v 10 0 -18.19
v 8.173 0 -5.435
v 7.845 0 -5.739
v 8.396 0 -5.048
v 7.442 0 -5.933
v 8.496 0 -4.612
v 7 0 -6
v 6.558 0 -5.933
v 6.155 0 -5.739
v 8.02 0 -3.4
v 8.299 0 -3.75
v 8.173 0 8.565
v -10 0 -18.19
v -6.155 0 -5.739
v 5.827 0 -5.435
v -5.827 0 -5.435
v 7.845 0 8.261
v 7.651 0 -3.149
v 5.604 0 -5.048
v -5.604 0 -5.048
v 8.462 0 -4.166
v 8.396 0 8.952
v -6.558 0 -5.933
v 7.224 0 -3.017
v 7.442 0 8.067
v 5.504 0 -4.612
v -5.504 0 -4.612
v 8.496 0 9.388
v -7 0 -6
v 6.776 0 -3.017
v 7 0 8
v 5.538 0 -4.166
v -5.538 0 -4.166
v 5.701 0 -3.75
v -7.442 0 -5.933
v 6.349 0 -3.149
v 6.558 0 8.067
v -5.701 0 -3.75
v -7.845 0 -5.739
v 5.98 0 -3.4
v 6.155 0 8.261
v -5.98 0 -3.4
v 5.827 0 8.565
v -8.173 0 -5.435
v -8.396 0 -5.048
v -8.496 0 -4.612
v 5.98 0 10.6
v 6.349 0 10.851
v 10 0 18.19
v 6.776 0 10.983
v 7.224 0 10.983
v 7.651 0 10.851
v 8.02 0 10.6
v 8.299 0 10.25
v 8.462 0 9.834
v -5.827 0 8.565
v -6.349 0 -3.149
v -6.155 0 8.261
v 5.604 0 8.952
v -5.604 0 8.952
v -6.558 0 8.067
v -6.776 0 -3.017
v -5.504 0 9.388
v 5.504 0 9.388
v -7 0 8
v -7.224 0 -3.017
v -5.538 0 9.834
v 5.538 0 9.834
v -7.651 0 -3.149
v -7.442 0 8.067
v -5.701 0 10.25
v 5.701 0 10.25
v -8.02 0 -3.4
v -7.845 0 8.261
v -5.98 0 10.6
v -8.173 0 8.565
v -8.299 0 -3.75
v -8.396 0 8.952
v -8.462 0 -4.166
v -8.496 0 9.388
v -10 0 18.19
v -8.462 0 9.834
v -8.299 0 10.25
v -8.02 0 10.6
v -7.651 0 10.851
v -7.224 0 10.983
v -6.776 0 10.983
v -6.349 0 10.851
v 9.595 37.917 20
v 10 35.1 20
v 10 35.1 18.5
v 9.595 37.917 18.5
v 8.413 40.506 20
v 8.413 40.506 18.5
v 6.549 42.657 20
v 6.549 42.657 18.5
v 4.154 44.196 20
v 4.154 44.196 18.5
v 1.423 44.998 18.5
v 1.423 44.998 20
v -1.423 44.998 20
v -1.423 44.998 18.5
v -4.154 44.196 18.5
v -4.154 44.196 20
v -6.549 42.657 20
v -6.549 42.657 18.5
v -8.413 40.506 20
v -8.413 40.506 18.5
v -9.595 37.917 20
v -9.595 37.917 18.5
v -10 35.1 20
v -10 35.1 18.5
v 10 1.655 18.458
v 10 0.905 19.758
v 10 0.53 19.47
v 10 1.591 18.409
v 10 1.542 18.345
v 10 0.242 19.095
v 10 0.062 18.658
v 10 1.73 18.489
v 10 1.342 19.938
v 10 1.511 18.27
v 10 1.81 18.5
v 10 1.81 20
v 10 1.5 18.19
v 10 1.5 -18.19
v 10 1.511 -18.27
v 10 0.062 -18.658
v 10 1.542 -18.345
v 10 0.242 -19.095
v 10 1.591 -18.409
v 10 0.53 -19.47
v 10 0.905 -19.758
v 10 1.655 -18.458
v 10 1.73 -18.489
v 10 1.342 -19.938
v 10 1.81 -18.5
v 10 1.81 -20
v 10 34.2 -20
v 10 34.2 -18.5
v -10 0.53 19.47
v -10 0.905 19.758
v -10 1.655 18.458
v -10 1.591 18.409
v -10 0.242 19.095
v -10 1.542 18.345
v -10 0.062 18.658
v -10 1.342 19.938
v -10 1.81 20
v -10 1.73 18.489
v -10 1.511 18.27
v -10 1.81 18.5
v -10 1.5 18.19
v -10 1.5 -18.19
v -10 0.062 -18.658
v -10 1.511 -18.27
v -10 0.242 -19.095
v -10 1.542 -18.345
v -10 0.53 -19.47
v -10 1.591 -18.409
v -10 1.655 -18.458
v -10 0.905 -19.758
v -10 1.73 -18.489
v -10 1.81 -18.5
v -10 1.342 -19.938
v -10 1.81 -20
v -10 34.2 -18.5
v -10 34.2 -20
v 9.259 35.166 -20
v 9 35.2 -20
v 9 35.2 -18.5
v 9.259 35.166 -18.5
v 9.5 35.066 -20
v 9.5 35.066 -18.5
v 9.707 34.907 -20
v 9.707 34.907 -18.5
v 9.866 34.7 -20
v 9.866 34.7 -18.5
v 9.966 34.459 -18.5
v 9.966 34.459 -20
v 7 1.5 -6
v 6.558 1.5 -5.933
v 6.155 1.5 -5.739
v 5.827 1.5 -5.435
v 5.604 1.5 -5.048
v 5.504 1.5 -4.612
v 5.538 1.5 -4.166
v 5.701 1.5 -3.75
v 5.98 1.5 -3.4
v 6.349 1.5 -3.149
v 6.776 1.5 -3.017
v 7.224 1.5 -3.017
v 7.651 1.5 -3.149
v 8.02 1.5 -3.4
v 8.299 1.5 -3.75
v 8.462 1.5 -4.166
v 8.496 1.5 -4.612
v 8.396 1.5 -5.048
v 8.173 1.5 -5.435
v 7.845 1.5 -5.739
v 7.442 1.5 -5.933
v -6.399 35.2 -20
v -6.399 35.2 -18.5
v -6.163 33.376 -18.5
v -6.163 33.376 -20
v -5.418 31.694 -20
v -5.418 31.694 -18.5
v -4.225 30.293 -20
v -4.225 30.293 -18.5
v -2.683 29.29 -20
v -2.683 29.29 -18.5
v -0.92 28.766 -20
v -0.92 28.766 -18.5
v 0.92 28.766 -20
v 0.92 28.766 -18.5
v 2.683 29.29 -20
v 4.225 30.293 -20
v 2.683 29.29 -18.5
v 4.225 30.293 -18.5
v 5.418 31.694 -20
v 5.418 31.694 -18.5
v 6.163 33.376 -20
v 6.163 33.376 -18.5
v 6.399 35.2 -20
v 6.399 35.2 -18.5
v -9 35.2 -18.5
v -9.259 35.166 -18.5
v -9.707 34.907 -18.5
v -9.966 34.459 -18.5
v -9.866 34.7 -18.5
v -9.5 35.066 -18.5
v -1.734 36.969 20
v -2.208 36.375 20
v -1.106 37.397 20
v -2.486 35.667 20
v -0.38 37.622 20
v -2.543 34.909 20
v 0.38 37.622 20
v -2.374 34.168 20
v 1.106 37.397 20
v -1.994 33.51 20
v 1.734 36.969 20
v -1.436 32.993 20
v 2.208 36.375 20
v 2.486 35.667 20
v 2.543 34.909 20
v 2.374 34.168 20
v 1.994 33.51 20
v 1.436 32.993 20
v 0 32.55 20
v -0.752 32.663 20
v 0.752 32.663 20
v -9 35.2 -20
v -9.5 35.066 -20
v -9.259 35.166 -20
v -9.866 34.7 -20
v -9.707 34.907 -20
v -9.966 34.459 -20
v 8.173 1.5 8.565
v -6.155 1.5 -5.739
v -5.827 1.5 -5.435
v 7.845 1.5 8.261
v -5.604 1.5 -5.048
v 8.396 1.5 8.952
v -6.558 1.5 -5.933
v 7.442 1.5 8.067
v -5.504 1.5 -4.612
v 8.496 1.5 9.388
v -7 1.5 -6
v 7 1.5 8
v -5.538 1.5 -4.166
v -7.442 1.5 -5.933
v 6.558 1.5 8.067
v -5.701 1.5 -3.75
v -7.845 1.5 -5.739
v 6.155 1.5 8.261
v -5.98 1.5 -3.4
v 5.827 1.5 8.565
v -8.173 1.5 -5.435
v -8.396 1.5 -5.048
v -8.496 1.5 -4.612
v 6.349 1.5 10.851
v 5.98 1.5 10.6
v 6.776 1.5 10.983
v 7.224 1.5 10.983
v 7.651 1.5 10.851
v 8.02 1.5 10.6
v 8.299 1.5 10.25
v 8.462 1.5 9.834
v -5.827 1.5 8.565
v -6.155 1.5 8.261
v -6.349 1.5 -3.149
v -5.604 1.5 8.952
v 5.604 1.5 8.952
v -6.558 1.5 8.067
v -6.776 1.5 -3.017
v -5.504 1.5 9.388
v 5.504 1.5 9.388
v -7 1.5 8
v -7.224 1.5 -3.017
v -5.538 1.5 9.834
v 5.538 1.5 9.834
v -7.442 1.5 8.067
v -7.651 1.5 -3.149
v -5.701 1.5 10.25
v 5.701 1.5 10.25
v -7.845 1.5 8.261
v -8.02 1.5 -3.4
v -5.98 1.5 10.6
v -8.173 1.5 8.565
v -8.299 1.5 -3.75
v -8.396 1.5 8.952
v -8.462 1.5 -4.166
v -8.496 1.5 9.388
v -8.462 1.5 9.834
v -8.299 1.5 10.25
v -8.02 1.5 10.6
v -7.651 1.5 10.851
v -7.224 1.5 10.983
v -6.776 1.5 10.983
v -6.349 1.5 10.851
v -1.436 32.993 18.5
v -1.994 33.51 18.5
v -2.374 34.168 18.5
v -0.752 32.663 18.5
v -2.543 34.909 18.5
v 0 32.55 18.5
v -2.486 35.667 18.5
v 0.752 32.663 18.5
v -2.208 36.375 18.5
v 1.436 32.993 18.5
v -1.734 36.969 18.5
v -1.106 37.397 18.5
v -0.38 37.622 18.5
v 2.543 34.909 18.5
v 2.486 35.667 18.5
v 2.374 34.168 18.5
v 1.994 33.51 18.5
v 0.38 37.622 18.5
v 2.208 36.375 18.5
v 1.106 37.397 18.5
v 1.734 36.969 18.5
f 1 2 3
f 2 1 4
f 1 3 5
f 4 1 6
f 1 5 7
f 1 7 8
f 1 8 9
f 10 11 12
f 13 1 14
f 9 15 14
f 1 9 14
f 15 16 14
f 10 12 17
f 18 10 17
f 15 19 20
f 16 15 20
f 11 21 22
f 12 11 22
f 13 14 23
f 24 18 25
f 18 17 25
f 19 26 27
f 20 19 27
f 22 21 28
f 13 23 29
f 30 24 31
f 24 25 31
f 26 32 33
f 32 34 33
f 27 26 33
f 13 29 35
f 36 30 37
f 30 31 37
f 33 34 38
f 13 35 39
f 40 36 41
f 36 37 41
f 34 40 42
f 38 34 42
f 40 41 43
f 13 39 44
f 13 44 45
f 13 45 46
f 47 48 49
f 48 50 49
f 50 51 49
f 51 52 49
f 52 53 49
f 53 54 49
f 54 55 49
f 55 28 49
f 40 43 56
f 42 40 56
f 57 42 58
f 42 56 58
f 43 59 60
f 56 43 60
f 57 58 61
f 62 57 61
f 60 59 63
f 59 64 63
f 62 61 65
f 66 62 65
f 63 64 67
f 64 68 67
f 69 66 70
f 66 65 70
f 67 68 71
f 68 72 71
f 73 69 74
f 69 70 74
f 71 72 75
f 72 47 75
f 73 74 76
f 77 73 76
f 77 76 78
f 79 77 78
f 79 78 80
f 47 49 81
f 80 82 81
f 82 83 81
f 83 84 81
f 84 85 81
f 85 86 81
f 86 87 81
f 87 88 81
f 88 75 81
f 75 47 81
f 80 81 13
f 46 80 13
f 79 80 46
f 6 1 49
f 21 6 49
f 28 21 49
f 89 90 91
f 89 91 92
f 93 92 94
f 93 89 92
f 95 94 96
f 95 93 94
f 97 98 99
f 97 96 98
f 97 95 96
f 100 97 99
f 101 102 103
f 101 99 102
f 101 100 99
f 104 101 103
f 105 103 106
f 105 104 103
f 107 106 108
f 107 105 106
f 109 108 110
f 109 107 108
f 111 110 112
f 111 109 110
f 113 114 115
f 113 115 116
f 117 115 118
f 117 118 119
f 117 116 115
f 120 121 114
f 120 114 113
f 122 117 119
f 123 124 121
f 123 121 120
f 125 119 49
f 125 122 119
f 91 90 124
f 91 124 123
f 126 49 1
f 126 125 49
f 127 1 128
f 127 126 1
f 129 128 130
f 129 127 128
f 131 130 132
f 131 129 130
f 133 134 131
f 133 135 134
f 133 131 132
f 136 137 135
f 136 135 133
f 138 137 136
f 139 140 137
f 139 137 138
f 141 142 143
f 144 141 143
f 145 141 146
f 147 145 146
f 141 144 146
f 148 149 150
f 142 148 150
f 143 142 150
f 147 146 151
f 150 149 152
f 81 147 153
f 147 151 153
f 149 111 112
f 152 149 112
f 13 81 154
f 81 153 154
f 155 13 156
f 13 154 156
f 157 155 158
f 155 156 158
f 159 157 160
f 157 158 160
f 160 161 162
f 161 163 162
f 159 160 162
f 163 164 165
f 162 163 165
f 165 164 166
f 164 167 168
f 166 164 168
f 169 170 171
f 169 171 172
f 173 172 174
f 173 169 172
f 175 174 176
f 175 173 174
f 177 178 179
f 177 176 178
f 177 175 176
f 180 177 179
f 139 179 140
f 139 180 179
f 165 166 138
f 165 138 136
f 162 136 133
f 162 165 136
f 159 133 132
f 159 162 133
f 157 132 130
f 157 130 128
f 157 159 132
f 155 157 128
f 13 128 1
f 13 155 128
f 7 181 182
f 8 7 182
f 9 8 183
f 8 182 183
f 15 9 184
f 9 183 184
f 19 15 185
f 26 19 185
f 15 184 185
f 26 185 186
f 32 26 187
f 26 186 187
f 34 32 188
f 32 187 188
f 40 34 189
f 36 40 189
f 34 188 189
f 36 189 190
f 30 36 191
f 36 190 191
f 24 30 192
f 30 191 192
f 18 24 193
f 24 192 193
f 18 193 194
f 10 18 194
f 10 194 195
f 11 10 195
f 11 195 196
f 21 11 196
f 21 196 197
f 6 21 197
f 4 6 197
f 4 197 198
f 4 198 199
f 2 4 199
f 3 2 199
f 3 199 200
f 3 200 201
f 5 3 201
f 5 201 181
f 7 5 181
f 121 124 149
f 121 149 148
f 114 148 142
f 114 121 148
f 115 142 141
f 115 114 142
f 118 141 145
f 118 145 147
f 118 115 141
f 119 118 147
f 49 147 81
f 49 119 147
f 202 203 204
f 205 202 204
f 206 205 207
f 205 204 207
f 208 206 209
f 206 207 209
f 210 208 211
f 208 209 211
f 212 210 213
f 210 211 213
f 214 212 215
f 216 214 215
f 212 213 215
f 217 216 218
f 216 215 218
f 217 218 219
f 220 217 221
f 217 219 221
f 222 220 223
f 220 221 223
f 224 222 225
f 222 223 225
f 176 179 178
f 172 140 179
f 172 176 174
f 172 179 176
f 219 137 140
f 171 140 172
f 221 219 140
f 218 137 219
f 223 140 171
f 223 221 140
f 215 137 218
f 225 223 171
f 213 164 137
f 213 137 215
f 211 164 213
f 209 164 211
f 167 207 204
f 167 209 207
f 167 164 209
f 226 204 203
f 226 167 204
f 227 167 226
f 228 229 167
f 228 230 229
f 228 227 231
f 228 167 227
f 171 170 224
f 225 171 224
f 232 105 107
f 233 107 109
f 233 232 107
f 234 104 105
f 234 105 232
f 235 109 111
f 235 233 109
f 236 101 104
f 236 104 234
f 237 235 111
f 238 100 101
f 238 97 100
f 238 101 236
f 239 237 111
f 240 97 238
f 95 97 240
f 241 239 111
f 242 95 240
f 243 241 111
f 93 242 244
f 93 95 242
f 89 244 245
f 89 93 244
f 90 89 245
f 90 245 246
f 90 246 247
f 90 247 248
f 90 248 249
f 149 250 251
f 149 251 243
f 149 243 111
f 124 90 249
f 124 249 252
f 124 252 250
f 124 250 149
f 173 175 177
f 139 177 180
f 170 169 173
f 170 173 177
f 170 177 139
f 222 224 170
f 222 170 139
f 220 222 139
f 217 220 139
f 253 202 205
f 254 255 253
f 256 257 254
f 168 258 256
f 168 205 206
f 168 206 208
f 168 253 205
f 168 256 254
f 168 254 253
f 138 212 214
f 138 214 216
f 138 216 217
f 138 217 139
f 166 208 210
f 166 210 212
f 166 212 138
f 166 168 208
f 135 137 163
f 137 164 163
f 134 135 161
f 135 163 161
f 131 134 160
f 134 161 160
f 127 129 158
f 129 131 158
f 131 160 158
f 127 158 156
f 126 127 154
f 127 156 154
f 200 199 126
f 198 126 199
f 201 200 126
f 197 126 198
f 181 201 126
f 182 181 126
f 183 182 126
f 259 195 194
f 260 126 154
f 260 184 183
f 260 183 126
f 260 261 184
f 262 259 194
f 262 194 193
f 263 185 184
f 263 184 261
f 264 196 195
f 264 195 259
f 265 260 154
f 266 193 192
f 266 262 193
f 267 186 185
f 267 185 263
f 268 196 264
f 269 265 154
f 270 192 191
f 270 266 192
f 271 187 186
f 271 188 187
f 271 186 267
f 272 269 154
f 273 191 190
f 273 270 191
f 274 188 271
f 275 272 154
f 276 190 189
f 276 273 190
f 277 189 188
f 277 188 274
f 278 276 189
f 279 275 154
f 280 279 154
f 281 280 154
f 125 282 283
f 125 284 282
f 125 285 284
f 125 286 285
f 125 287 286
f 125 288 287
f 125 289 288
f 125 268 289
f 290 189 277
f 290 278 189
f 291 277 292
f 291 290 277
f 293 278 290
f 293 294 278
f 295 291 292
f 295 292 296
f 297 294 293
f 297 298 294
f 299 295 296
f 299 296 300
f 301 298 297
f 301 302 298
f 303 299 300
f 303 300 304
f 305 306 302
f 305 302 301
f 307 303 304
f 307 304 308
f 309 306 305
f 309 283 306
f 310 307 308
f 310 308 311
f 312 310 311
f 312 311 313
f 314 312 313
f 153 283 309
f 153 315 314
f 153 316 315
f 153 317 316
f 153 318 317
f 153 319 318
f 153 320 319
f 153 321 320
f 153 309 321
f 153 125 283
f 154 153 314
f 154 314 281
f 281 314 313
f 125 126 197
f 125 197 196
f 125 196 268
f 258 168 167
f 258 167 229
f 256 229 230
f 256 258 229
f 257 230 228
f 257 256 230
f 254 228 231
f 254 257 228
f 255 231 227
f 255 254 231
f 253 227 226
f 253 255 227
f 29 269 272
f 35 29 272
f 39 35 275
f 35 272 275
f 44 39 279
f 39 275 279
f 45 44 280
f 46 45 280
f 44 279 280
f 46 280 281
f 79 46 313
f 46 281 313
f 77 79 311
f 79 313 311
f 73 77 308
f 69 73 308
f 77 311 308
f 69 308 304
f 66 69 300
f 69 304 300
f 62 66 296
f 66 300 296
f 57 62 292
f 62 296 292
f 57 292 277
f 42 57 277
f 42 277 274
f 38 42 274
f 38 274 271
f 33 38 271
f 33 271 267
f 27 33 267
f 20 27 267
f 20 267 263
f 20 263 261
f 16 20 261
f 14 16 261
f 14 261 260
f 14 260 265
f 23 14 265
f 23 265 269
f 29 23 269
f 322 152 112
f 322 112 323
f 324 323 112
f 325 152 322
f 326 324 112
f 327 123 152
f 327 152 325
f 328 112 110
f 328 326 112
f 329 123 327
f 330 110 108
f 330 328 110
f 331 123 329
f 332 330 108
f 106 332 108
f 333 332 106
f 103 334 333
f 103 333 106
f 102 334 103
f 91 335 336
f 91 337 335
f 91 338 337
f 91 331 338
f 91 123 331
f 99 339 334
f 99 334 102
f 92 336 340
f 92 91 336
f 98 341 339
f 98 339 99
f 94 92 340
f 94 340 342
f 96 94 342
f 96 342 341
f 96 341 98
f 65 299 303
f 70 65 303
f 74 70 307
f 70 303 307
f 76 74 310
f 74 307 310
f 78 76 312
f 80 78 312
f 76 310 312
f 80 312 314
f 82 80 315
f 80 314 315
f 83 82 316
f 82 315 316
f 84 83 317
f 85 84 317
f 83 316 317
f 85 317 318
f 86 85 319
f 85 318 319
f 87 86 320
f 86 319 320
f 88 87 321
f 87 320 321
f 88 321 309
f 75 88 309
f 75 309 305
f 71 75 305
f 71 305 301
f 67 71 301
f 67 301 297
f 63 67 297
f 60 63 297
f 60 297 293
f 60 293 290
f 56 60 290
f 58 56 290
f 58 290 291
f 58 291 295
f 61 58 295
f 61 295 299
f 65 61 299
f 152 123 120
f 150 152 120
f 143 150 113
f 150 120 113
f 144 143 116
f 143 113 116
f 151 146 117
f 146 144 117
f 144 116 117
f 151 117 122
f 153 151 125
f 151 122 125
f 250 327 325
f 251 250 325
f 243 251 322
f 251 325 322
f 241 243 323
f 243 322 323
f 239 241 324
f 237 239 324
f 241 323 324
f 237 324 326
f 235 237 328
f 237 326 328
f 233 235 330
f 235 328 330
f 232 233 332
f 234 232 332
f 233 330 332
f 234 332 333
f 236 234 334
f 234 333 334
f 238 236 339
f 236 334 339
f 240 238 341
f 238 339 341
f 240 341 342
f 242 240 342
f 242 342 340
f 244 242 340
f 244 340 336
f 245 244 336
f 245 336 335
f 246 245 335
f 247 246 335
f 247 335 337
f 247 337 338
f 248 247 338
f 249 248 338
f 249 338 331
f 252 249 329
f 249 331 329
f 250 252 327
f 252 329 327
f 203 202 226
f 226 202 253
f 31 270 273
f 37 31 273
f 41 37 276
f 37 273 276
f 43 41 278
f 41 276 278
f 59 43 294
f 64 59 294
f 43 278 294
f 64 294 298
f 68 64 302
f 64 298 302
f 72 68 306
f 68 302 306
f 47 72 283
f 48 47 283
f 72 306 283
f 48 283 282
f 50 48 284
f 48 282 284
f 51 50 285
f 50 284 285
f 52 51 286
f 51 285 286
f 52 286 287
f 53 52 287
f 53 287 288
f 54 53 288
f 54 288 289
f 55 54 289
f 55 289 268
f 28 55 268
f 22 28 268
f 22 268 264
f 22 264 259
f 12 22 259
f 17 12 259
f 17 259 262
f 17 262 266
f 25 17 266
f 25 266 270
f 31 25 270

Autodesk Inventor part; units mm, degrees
ref_plane "YZ Plane" through (0, 0, 0) normal (1, 0, 0) x (0, 1, 0)
ref_plane "XZ Plane" through (0, 0, 0) normal (0, 1, 0) x (-1, 0, 0)
ref_plane "XY Plane" through (0, 0, 0) normal (0, 0, 1) x (1, 0, 0)
sketch "Sketch1" plane through (0, 0, 0) normal (0, 1, 0) x (-1, 0, 0)
  line L0 (10, -18.5) -> (-10, -18.5)
  line L1 (-10, -18.5) -> (-10, 18.5)
  line L2 (-10, 18.5) -> (10, 18.5)
  line L3 (10, 18.5) -> (10, -18.5)
  point P0 (0, 0)
  dimension "d0" = 20
  dimension "d1" = 37
  dimension "d2" = 18.5
  dimension "d3" = 10
extrude "Plate1" add sketch "Sketch1" along normal blind 1.5
sketch "Sketch2" plane through (-10, 0, -20) normal (0, 0, 1) x (1, 0, 0)
  line L0 (20, 0) -> (0, 0)
  line L1 (0, 0) -> (0, 45.1)
  line L2 (0, 45.1) -> (20, 45.1)
  line L3 (20, 45.1) -> (20, 0)
edge flange "Flange1" height 45.1 angle 90 thickness 1.5 bend radius 0.31 thickness toward (0, 0, 1) relief tear relief width 1.5 relief depth 0.75 edges at (0, 1.5, -18.5) wall of the first edge with corners at (10, 0, -20) (-10, 0, -20) (-10, 45.1, -20) (10, 45.1, -20)
bend "Bend1"
corner "Corner1"
sketch "Sketch3" plane through (10, 0, 20) normal (0, 0, -1) x (-1, 0, 0)
  line L0 (20, 0) -> (0, 0)
  line L1 (0, 0) -> (0, 45.1)
  line L2 (0, 45.1) -> (20, 45.1)
  line L3 (20, 45.1) -> (20, 0)
edge flange "Flange2" height 45.1 angle 90 thickness 1.5 bend radius 0.31 thickness toward (0, 0, -1) relief tear relief width 1.5 relief depth 0.75 edges at (0, 1.5, 18.5) wall of the first edge with corners at (-10, 0, 20) (10, 0, 20) (10, 45.1, 20) (-10, 45.1, 20)
bend "Bend2"
corner "Corner2"
sketch "Sketch4" plane through (-10, 45.1, 20) normal (0, 0, 1) x (1, 0, 0)
  circle A0 centre (10, -10) radius 10
  line L0 (0, 0) -> (20, 0) projected
  line L1 (0, 0) -> (20, 0)
  line L2 (20, 0) -> (20, -10)
  line L3 (20, -10) -> (0, -10)
  line L4 (0, -10) -> (0, 0)
  line L5 (0, -43.29) -> (0, 0) projected
  point P0 (10, -45.1)
  point P1 (10, -10)
  point P2 (20, 0)
  point P3 (10, 0)
  point P4 (0, -10)
  point P5 (8.5893, 0)
  point P6 (0, -10)
  dimension "d26" = 20
  dimension "d25" = 10
  dimension "d27" = 10
  dimension "d28" = 10
extrude "Extrusion1" cut sketch "Sketch4" against normal blind 10 contours L4 L0 A0 | A0 L0 L2
sketch "Sketch5" plane through (10, 45.1, -20) normal (0, 0, -1) x (-1, 0, 0)
  arc A0 (20, -10) -> (0, -10) centre (10, -10) ccw projected
  point P0 (10, -45.1)
hole "Hole1" at (0, 35.1, -20) direction (0, 0, 1) diameter 12.8 depth 1.5
sketch "Sketch6" plane through (10, 45.1, -20) normal (0, 0, -1) x (-1, 0, 0)
  circle A0 centre (10, -10) radius 6.4 projected
  line L0 (0, 0) -> (20, 0) projected
  line L1 (0, -43.29) -> (0, 0) projected
  line L2 (24, 0) -> (-4, 0)
  line L3 (-4, 0) -> (-4, -9.9)
  line L4 (-4, -9.9) -> (24, -9.9)
  line L5 (24, -9.9) -> (24, 0)
  point P0 (10, -45.1)
  point P1 (20, 0)
  point P2 (6.005, 0)
  point P3 (13.995, 0)
  dimension "d38" = 9.9
  dimension "d39" = 4
  dimension "d40" = 28
extrude "Extrusion2" cut sketch "Sketch6" against normal blind 10 contours L4 A0 | A0 L4 L1 L0 L2 L5 | L4 L3 L2 L1 picked at (9.1972, -6.4205)
fillet "Fillet1" radius 1 2 edges at (-10, 35.2, -19.25) (10, 35.2, -19.25)
sketch "Sketch7" plane through (-10, 1.81, 20) normal (0, 0, 1) x (1, 0, 0)
  arc A0 (20, 33.29) -> (0, 33.29) centre (10, 33.29) ccw projected
  point P0 (10, -1.81)
hole "Hole2" at (0, 35.1, 20) direction (0, 0, -1) diameter 5.1 depth 1.5 clearance for "Hex Head Bolt" size "M5" standard "Ansi Metric M Profile"
sketch "Sketch8" plane through (0, 0, 0) normal (0, -1, 0) x (1, 0, 0)
  line L0 (2.55, 18.5) -> (-2.55, 18.5) projected
  line L1 (-10, 18.5) -> (10, 18.5) projected
  line L2 (10, 18.5) -> (-10, 18.5) projected
  line L3 (10, 18.19) -> (-10, 18.19) projected
  line L4 (-10, -18.19) -> (-10, 18.19) projected
  line L5 (-10, -18.19) -> (10, -18.19) projected
  line L6 (10, 18.19) -> (10, -18.19) projected
  point P0 (0, 0)
  point P1 (7, 9.5)
  point P2 (7, -4.5)
  point P3 (-7, 9.5)
  point P4 (-7, -4.5)
  dimension "d51" = 9
  dimension "d52" = 3
  dimension "d55" = 14
  dimension "d58" = 14
hole "Hole3" at (7, 0, 9.5) at (7, 0, -4.5) at (-7, 0, 9.5) at (-7, 0, -4.5) direction (0, 1, 0) diameter 3 depth 1.5
equation "\"d36\" = Thickness"
equation "\"d49\" = Thickness"
equation "\"d66\" = Thickness"
equation "\"d4\" = Thickness"
equation "\"d5\" = BendReliefWidth"
equation "\"d6\" = BendReliefDepth"
equation "\"d7\" = MinimumRemnant"
equation "\"d8\" = TransitionRadius"
equation "\"d11\" = BendRadius"
equation "\"d12\" = CornerReliefSize"
equation "\"d13\" = GapSize"
equation "\"d14\" = JacobiRadiusSize"
equation "\"d15\" = BendReliefWidth"
equation "\"d16\" = BendReliefDepth"
equation "\"d17\" = MinimumRemnant"
equation "\"d18\" = TransitionRadius"
equation "\"d21\" = BendRadius"
equation "\"d22\" = CornerReliefSize"
equation "\"d23\" = GapSize"
equation "\"d24\" = JacobiRadiusSize"
equation "\"BendReliefWidth\" = Thickness"
equation "\"BendReliefDepth\" = 0.5 * Thickness"
equation "\"CornerReliefSize\" = 4 * Thickness"
equation "\"MinimumRemnant\" = 2 * Thickness"
equation "\"TransitionRadius\" = BendRadius"
equation "\"JacobiRadiusSize\" = BendRadius"
equation "\"GapSize\" = Thickness"
equation "\"Thickness\" = 1.5"
equation "\"BendRadius\" = 0.31"
properties part number "axis_9_bottom_frame" material "Aluminum 6061-AHC"
